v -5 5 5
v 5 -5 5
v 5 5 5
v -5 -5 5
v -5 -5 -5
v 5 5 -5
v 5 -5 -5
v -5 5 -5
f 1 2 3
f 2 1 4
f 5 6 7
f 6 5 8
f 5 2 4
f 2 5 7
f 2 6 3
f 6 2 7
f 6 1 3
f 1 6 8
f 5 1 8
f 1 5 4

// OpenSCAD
module widget() {
  cube([10, 10, 10], center = true);
}

// Top-level invocation so this file renders standalone in the editor.
// Safe under `use <…>` from main.scad — top-level calls in `use`d files
// are not executed by the importing file.
widget();
